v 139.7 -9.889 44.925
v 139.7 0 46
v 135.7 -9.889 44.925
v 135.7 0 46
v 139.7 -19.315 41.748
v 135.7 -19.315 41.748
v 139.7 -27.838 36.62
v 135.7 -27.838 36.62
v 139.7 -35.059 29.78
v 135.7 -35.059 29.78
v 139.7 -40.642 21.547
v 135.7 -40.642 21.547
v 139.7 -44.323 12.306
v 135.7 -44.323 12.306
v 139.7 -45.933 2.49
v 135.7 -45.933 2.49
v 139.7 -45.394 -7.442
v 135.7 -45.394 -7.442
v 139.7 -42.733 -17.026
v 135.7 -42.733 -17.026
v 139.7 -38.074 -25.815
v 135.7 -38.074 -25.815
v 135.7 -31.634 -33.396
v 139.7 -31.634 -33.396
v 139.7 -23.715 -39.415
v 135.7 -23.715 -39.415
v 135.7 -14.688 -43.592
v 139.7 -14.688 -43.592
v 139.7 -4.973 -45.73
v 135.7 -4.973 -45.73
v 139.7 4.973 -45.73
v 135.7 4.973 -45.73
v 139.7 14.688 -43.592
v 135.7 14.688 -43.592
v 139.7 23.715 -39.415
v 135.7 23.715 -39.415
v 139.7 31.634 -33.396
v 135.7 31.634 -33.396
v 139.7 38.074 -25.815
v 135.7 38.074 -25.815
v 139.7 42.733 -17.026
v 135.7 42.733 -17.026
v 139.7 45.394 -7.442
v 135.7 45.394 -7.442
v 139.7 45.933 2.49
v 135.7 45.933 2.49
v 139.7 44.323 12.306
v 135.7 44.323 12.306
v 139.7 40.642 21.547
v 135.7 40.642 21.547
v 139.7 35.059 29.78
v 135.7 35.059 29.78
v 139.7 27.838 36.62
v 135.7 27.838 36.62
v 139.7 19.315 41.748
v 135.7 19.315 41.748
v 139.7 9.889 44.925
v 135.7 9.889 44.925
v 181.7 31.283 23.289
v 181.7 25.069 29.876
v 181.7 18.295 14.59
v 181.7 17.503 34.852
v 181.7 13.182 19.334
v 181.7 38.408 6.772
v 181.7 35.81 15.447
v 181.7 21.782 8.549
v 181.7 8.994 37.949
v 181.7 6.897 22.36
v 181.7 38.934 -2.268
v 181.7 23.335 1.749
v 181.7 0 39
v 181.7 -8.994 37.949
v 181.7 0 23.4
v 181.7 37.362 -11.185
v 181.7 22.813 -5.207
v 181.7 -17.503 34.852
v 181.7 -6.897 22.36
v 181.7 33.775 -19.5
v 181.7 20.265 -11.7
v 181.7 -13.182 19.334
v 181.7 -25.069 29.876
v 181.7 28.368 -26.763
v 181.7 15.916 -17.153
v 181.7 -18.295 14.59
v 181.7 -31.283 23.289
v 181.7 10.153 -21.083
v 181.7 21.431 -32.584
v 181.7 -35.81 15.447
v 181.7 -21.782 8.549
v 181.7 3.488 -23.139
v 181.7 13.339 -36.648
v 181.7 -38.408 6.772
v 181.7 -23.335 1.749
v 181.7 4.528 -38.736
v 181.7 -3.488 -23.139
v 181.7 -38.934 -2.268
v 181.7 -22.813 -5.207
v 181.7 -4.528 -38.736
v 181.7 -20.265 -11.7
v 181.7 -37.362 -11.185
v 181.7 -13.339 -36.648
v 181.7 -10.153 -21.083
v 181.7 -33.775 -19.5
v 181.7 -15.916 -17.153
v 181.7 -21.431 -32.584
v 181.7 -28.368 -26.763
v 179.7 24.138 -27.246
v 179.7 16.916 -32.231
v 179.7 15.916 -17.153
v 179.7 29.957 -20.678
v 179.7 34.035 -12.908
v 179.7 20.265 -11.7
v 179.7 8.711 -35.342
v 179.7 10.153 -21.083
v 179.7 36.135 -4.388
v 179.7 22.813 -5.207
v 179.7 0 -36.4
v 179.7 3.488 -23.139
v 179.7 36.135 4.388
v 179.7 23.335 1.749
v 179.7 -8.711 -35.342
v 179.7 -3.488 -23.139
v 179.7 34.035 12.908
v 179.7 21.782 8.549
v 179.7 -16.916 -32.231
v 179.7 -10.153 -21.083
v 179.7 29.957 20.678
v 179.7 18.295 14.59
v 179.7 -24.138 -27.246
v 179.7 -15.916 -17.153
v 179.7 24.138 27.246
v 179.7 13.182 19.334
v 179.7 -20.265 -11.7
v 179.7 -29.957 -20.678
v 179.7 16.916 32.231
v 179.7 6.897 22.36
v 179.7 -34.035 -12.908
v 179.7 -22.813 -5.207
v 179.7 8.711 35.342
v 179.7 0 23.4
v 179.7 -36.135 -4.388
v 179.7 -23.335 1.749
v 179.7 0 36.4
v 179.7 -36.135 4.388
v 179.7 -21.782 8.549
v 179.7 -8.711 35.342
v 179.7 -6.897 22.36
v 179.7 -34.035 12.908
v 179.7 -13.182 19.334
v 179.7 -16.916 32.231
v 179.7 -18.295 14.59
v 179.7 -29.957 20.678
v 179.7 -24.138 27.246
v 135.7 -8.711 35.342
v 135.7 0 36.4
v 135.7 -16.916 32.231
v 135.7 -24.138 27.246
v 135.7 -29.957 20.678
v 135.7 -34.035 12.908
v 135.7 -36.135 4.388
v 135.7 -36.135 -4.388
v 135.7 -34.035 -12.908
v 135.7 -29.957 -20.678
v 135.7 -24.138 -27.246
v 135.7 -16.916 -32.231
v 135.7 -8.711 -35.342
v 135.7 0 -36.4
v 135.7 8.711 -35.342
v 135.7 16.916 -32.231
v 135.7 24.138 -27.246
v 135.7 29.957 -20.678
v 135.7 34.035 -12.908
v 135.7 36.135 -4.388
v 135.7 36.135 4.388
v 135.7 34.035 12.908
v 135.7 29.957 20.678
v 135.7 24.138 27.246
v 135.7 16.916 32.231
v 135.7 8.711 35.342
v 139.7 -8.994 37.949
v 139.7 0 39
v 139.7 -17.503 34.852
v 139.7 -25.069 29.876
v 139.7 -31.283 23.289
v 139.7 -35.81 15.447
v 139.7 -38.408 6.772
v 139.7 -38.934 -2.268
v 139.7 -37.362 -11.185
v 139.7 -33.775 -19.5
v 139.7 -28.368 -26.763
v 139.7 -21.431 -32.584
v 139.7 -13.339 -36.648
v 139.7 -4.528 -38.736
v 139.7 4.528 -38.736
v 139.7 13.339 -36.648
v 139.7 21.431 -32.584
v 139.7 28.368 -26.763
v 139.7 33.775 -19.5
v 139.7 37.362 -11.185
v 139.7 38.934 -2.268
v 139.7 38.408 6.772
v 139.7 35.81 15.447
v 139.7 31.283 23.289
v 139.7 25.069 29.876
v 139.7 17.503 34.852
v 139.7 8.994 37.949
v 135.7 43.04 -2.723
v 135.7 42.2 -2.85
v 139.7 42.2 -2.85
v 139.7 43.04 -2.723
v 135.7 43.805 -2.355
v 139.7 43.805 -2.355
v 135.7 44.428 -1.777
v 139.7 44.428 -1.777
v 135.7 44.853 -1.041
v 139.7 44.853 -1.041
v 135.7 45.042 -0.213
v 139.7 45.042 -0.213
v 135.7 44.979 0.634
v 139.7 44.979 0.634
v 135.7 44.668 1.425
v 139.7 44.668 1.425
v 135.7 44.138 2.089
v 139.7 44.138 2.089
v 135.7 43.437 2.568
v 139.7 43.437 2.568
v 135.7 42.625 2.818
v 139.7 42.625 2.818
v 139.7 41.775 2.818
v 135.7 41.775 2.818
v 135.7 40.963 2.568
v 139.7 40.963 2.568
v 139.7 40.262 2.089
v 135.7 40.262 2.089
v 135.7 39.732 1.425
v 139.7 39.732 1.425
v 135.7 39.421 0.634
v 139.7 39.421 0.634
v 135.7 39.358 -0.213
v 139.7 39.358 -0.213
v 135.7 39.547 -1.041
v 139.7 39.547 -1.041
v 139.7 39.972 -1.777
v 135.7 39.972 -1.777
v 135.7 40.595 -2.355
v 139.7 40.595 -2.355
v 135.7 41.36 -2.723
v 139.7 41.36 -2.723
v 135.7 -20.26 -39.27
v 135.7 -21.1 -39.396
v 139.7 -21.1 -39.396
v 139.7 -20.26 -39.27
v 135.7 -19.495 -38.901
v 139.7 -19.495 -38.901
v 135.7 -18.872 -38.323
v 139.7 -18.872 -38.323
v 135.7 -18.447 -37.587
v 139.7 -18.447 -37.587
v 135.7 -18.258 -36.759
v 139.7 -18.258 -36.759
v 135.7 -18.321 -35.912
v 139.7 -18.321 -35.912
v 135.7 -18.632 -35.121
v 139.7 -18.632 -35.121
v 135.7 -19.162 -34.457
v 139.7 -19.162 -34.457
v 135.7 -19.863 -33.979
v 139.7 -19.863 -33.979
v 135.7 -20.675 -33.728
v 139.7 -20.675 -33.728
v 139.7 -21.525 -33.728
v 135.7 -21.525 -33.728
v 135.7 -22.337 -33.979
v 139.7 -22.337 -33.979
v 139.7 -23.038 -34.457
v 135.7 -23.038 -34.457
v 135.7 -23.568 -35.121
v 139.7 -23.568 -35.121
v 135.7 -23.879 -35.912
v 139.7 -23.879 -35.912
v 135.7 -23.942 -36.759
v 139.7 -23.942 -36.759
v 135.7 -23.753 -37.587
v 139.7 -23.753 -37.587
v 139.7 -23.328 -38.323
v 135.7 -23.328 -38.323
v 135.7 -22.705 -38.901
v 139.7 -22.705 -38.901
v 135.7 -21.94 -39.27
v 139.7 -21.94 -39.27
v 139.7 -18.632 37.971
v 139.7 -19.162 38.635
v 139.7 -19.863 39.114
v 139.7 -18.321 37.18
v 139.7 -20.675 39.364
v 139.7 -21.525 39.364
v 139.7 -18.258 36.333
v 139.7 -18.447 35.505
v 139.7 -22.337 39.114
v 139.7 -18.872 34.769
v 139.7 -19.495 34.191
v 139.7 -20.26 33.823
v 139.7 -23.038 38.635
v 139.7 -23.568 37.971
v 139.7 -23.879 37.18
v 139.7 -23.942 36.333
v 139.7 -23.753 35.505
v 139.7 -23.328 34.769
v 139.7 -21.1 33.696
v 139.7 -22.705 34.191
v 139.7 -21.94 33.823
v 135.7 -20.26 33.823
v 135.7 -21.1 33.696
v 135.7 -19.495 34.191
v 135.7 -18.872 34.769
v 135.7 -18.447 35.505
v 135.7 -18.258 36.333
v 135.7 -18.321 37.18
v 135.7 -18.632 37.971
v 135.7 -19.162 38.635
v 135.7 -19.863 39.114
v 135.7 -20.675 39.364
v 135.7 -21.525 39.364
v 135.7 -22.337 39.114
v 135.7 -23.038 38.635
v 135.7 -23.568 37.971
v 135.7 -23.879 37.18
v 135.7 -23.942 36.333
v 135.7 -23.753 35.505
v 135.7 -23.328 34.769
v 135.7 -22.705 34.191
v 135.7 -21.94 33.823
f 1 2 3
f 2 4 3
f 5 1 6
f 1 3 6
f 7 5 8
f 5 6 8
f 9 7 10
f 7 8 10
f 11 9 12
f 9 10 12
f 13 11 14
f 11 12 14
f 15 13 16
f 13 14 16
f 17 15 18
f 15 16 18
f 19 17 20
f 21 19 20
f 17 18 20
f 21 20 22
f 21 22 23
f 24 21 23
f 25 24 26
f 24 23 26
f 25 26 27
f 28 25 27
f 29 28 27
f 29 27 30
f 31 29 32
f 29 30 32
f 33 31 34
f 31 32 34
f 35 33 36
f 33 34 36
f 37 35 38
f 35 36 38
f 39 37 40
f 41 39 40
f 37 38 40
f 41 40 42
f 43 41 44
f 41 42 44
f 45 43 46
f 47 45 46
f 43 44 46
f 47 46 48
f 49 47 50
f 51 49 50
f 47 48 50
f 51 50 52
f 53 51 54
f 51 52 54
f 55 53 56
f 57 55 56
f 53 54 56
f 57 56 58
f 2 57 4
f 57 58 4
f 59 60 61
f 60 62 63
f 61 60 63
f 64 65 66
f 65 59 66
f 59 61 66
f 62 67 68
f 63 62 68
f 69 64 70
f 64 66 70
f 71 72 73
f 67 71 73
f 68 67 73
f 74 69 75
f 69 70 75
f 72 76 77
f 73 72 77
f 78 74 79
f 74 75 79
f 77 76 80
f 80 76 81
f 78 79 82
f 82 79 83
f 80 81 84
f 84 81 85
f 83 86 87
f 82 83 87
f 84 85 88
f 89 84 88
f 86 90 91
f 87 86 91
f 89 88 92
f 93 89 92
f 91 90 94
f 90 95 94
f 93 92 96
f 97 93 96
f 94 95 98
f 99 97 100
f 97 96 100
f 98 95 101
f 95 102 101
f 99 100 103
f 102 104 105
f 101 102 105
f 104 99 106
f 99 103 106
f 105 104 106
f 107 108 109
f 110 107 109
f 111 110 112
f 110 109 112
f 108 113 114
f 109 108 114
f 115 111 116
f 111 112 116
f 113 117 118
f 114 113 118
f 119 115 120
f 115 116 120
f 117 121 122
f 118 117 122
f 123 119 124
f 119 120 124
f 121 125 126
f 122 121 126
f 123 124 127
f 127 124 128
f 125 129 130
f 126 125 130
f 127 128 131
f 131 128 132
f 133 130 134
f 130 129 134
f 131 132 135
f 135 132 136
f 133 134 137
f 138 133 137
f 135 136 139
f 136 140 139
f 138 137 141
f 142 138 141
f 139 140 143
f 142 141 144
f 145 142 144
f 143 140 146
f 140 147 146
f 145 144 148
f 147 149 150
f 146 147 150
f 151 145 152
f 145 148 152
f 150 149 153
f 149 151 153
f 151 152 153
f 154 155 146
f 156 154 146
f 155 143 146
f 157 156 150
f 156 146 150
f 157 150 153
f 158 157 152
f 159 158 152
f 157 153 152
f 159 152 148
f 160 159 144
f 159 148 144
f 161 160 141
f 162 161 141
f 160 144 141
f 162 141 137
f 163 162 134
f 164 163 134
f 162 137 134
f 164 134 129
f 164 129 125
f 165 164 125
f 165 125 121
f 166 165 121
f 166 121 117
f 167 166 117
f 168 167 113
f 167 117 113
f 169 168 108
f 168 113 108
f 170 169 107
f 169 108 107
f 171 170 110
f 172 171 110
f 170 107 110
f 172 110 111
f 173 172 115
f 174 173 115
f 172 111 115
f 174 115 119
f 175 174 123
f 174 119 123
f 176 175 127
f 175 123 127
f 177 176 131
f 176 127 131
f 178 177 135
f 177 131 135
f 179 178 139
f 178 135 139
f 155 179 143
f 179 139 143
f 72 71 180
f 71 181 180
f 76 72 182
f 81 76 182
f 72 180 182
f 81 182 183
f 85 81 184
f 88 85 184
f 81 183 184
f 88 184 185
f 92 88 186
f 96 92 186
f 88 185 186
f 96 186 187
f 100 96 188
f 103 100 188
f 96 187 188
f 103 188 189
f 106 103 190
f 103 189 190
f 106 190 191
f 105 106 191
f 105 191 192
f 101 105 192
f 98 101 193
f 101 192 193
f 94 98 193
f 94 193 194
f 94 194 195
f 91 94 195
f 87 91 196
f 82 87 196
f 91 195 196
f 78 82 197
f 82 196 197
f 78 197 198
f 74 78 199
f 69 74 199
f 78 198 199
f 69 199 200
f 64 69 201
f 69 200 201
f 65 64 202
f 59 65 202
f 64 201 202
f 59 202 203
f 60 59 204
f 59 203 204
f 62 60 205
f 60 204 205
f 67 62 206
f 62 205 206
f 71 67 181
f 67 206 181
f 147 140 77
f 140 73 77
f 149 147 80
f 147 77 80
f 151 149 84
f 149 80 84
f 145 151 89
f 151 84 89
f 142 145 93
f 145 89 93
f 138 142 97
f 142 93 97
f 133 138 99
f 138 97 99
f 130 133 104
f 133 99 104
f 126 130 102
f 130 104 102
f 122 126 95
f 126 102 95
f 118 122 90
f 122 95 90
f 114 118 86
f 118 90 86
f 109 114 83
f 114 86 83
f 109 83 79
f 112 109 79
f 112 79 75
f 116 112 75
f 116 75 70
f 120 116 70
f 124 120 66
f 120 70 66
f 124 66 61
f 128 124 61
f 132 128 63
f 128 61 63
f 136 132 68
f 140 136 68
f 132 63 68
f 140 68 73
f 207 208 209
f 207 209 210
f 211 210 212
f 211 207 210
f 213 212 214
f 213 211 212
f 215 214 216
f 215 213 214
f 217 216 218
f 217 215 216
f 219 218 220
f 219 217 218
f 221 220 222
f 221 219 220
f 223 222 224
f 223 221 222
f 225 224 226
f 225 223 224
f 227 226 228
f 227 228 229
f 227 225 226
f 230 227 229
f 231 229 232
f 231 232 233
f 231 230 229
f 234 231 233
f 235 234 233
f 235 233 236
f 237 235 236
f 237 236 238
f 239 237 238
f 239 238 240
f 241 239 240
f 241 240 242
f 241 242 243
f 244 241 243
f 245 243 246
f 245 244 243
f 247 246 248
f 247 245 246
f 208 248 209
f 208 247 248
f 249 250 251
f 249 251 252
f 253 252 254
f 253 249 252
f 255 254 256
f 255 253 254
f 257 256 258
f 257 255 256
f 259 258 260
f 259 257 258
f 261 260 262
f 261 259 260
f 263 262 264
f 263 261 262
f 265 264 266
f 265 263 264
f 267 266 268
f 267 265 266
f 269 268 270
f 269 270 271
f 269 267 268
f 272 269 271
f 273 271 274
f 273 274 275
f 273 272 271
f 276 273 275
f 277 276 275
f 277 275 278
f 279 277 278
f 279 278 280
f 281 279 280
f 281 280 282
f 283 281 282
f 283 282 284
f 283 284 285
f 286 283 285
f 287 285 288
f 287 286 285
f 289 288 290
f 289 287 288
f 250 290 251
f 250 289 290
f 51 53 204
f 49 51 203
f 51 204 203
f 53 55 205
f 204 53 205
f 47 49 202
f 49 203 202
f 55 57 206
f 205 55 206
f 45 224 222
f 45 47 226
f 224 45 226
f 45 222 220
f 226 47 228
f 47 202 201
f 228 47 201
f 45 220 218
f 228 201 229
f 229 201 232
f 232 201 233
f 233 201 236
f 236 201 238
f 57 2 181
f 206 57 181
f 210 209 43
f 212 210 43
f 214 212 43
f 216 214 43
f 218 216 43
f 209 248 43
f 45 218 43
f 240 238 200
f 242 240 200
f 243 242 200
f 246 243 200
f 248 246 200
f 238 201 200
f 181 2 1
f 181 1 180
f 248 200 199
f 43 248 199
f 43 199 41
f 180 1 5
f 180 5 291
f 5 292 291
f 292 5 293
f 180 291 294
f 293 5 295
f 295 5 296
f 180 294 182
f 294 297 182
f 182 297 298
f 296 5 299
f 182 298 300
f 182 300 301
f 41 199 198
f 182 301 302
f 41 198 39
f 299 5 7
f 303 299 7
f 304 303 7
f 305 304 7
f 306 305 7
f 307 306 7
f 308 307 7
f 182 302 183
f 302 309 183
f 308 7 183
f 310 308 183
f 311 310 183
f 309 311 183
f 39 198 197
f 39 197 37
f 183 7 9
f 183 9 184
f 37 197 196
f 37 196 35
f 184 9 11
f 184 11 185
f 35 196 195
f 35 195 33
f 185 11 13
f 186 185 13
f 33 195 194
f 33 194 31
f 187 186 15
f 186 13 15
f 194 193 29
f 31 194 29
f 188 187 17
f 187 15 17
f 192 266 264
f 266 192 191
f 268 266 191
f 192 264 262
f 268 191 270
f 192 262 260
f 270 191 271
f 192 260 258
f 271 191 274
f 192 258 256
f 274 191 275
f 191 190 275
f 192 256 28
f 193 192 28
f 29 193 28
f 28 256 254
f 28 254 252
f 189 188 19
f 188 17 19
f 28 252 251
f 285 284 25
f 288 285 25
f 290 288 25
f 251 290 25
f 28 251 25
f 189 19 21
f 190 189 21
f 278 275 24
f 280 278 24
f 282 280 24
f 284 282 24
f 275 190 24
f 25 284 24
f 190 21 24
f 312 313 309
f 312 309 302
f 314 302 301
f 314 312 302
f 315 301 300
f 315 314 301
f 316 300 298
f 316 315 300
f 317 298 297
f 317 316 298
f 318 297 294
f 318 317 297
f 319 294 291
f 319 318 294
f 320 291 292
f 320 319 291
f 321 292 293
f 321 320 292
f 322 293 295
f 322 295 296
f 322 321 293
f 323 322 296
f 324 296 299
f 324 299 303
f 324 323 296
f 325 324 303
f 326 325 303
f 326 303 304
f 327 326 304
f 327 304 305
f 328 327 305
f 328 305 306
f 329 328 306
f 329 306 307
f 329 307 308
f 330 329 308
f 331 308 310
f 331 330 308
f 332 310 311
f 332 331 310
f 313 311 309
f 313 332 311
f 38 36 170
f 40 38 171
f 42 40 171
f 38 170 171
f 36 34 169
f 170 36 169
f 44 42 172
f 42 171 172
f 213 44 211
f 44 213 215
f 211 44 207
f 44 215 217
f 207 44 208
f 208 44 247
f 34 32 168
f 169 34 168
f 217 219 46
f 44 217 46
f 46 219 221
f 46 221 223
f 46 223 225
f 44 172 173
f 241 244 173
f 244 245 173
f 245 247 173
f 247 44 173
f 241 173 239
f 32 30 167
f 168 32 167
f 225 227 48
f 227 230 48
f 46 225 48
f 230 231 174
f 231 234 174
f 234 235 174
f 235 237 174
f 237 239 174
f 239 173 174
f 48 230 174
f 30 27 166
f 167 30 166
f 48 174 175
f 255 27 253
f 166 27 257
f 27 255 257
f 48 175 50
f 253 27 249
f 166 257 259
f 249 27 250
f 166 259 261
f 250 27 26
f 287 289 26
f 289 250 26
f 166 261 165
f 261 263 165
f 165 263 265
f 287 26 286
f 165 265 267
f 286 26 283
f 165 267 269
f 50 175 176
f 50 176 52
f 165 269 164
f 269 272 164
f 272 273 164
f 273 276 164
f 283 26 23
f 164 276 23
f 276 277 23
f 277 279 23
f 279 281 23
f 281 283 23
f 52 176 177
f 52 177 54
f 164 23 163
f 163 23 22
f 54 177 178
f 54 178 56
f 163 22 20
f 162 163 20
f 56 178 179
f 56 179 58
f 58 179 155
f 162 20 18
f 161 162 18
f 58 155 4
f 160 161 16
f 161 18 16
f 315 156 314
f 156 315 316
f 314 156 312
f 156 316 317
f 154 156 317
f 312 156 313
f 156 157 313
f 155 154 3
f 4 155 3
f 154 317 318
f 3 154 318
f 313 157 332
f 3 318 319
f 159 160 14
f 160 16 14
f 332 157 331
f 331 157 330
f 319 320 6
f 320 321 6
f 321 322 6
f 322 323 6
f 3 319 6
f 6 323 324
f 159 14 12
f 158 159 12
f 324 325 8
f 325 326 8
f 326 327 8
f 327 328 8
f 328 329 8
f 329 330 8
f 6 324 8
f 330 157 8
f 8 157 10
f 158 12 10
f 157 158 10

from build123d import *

# Parameters (mm, degrees)
AXIAL_HOLES_DEPTH      = 193.994533601
AXIAL_HOLES_DEPTH_BACK = 193.994533601
SKETCH2_R              = 1.65
CUT_EXTRUDE2_START     = 135.7
SKETCH3_R              = 2.85
CUT_EXTRUDE2_DEPTH     = 4


with BuildPart() as part:
    # Axial profile (mm) → Full revolution (revolve)
    with BuildSketch(Plane.XY, mode=Mode.PRIVATE) as full_revolution_sk:
        Polygon((135.7, 36.4), (179.7, 36.4), (179.7, 23.4), (181.7, 23.4), (181.7, 39), (139.7, 39), (139.7, 46), (135.7, 46), align=None)
    revolve(full_revolution_sk.sketch.rotate(Axis((-110, 0, 0), (1, 0, 0)), 90), axis=Axis((-110, 0, 0), (1, 0, 0)))

    # Sketch2 → Axial holes (cut, two sides: drawn at the far end of the back side and taken through both)
    with BuildSketch(Plane(origin=(0, 0, 0), x_dir=(0, 0, -1), z_dir=(1, 0, 0)).offset(-AXIAL_HOLES_DEPTH_BACK)):
        with Locations(Location((0, 42.2, 0), (0, 0, 180))):
            Circle(SKETCH2_R)
        with Locations(Location((-36.54627204, -21.1, 0), (0, 0, 180))):
            Circle(SKETCH2_R)
        with Locations(Location((36.54627204, -21.1, 0), (0, 0, 180))):
            Circle(SKETCH2_R)
    extrude(amount=AXIAL_HOLES_DEPTH + AXIAL_HOLES_DEPTH_BACK, mode=Mode.SUBTRACT)

    # Sketch3 → Cut-Extrude2 (cut)
    with BuildSketch(Plane(origin=(0, 0, 0), x_dir=(0, 0, -1), z_dir=(1, 0, 0)).offset(CUT_EXTRUDE2_START)):
        with Locations((0, 42.2)):
            Circle(SKETCH3_R)
        with Locations((-36.54627204, -21.1)):
            Circle(SKETCH3_R)
        with Locations((36.54627204, -21.1)):
            Circle(SKETCH3_R)
    extrude(amount=CUT_EXTRUDE2_DEPTH, mode=Mode.SUBTRACT)


solid = part.part
